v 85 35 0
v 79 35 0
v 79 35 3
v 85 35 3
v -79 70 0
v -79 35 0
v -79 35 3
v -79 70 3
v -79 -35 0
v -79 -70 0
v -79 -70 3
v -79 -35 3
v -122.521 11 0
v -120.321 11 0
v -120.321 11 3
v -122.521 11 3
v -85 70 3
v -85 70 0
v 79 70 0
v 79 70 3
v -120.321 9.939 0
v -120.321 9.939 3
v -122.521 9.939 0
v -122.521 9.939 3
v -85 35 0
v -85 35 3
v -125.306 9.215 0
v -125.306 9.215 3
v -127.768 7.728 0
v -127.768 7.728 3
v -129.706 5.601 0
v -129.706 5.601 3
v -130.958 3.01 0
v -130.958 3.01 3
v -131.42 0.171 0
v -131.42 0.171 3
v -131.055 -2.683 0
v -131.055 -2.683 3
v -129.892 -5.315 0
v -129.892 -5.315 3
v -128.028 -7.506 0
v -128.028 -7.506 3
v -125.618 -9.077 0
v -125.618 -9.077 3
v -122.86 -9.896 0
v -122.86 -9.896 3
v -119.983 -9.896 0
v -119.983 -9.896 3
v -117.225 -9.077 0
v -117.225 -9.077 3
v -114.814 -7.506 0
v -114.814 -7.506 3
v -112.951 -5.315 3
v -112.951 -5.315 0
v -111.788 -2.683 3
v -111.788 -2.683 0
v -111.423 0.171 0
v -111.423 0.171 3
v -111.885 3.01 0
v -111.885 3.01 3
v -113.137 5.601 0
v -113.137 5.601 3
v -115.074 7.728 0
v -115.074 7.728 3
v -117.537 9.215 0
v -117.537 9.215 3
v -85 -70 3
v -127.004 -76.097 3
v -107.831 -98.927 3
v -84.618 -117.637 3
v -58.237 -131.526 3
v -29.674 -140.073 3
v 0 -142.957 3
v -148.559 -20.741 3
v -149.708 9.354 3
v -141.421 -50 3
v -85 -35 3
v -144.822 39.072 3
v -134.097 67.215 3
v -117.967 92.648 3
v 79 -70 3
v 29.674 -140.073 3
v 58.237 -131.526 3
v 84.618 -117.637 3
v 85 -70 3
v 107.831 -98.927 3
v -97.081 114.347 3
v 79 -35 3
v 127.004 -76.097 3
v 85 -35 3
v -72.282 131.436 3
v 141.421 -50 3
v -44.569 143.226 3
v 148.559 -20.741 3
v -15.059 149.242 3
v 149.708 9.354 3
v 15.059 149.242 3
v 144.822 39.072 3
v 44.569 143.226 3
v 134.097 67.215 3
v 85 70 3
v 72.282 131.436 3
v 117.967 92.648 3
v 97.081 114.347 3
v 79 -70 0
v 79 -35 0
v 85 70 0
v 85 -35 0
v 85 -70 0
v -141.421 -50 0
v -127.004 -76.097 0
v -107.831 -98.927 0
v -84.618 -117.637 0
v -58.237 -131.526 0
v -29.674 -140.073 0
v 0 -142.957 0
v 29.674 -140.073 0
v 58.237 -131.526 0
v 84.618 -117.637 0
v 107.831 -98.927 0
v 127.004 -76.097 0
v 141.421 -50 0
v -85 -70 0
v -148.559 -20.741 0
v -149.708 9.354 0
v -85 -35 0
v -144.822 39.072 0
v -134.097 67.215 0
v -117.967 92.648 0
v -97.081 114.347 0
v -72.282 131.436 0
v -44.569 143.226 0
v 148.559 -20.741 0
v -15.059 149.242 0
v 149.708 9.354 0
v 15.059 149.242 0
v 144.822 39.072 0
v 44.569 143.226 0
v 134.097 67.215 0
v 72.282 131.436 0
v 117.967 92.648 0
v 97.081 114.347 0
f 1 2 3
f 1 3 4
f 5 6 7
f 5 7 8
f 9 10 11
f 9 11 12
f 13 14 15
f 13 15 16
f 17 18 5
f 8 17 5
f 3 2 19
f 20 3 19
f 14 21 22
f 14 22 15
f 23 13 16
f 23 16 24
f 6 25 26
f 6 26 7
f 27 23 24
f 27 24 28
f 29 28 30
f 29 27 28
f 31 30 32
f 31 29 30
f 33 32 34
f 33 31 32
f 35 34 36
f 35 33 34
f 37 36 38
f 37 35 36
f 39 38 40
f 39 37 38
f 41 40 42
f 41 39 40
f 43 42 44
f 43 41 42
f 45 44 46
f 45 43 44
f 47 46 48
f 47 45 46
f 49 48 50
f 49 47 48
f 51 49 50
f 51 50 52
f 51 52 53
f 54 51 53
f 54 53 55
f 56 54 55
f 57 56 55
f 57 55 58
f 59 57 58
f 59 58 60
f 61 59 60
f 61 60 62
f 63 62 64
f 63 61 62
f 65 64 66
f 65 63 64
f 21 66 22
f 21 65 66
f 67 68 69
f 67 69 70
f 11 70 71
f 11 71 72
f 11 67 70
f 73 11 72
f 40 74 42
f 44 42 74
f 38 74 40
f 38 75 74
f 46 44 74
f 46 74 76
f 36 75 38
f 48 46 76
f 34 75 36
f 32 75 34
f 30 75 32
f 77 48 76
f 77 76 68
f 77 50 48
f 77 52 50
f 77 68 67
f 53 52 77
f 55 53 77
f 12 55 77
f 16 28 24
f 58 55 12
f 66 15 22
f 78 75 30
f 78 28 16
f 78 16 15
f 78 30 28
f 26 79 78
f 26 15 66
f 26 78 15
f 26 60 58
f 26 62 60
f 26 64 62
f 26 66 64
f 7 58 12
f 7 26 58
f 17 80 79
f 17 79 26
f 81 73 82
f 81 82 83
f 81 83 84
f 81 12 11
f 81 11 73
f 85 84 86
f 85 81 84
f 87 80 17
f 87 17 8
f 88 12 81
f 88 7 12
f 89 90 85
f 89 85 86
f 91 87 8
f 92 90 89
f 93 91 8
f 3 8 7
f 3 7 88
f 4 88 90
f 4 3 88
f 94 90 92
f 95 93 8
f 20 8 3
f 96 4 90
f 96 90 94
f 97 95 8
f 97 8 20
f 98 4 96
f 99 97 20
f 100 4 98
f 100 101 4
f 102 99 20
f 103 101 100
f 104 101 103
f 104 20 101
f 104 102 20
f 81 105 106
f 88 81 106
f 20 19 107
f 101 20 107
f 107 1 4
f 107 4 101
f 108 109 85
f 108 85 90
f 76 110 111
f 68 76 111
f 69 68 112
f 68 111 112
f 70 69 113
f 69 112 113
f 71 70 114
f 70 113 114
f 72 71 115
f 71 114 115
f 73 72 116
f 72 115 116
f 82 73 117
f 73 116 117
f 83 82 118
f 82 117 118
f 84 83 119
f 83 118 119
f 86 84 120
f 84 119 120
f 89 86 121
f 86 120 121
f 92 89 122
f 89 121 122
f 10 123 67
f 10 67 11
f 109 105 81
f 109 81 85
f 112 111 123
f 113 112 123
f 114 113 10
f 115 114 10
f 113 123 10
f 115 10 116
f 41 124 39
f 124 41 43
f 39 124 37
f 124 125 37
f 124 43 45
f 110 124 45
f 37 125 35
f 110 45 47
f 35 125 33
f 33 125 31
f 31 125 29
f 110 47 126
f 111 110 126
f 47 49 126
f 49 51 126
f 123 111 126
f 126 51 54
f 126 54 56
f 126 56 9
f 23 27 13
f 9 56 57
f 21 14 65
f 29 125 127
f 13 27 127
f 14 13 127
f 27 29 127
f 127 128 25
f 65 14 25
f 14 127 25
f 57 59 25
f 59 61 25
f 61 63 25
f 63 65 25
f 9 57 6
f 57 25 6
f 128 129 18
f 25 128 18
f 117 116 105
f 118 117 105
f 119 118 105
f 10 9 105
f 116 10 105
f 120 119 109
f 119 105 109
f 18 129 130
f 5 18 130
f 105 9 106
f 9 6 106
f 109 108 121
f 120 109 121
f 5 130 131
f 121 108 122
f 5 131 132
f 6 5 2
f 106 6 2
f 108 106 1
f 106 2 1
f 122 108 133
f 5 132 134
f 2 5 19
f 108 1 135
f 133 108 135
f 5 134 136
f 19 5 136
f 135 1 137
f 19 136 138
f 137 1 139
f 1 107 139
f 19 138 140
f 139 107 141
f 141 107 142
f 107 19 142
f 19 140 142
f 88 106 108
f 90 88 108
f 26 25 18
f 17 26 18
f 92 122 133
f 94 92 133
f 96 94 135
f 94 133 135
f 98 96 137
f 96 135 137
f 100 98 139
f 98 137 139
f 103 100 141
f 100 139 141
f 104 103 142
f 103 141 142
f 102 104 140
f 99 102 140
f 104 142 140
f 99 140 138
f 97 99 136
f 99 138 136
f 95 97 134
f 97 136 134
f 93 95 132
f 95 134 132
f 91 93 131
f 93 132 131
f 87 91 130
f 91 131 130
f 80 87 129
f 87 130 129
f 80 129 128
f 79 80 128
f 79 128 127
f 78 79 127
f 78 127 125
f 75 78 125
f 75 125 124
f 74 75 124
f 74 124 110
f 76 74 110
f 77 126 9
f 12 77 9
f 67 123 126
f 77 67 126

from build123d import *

# Parameters (mm, degrees)
ESBO_O1_W                = 6
ESBO_O1_H                = 35
RESSALTO_EXTRUS_O1_DEPTH = 3


with BuildPart() as part:
    # Esboço1 → Ressalto-extrusão1 (new body)
    with BuildSketch(Plane.XY):
        with BuildLine():
            ThreePointArc((141.421356237, -50), (0, 150), (-141.421356237, -50))
            ThreePointArc((-141.421356237, -50), (0, -142.957457878), (141.421356237, -50))
        make_face()
        with BuildLine():
            Line((-120.321356237, 11), (-122.521356237, 11))
            Line((-122.521356237, 11), (-122.521356237, 9.939315872))
            ThreePointArc((-122.521356237, 9.939315872), (-121.421356237, -10), (-120.321356237, 9.939315872))
            Line((-120.321356237, 9.939315872), (-120.321356237, 11))
        make_face(mode=Mode.SUBTRACT)
        with Locations((-82, -52.5)):
            Rectangle(ESBO_O1_W, ESBO_O1_H, mode=Mode.SUBTRACT)
        with Locations((-82, 52.5)):
            Rectangle(ESBO_O1_W, ESBO_O1_H, mode=Mode.SUBTRACT)
        with Locations((82, -52.5)):
            Rectangle(ESBO_O1_W, ESBO_O1_H, mode=Mode.SUBTRACT)
        with Locations((82, 52.5)):
            Rectangle(ESBO_O1_W, ESBO_O1_H, mode=Mode.SUBTRACT)
    extrude(amount=RESSALTO_EXTRUS_O1_DEPTH)


solid = part.part
